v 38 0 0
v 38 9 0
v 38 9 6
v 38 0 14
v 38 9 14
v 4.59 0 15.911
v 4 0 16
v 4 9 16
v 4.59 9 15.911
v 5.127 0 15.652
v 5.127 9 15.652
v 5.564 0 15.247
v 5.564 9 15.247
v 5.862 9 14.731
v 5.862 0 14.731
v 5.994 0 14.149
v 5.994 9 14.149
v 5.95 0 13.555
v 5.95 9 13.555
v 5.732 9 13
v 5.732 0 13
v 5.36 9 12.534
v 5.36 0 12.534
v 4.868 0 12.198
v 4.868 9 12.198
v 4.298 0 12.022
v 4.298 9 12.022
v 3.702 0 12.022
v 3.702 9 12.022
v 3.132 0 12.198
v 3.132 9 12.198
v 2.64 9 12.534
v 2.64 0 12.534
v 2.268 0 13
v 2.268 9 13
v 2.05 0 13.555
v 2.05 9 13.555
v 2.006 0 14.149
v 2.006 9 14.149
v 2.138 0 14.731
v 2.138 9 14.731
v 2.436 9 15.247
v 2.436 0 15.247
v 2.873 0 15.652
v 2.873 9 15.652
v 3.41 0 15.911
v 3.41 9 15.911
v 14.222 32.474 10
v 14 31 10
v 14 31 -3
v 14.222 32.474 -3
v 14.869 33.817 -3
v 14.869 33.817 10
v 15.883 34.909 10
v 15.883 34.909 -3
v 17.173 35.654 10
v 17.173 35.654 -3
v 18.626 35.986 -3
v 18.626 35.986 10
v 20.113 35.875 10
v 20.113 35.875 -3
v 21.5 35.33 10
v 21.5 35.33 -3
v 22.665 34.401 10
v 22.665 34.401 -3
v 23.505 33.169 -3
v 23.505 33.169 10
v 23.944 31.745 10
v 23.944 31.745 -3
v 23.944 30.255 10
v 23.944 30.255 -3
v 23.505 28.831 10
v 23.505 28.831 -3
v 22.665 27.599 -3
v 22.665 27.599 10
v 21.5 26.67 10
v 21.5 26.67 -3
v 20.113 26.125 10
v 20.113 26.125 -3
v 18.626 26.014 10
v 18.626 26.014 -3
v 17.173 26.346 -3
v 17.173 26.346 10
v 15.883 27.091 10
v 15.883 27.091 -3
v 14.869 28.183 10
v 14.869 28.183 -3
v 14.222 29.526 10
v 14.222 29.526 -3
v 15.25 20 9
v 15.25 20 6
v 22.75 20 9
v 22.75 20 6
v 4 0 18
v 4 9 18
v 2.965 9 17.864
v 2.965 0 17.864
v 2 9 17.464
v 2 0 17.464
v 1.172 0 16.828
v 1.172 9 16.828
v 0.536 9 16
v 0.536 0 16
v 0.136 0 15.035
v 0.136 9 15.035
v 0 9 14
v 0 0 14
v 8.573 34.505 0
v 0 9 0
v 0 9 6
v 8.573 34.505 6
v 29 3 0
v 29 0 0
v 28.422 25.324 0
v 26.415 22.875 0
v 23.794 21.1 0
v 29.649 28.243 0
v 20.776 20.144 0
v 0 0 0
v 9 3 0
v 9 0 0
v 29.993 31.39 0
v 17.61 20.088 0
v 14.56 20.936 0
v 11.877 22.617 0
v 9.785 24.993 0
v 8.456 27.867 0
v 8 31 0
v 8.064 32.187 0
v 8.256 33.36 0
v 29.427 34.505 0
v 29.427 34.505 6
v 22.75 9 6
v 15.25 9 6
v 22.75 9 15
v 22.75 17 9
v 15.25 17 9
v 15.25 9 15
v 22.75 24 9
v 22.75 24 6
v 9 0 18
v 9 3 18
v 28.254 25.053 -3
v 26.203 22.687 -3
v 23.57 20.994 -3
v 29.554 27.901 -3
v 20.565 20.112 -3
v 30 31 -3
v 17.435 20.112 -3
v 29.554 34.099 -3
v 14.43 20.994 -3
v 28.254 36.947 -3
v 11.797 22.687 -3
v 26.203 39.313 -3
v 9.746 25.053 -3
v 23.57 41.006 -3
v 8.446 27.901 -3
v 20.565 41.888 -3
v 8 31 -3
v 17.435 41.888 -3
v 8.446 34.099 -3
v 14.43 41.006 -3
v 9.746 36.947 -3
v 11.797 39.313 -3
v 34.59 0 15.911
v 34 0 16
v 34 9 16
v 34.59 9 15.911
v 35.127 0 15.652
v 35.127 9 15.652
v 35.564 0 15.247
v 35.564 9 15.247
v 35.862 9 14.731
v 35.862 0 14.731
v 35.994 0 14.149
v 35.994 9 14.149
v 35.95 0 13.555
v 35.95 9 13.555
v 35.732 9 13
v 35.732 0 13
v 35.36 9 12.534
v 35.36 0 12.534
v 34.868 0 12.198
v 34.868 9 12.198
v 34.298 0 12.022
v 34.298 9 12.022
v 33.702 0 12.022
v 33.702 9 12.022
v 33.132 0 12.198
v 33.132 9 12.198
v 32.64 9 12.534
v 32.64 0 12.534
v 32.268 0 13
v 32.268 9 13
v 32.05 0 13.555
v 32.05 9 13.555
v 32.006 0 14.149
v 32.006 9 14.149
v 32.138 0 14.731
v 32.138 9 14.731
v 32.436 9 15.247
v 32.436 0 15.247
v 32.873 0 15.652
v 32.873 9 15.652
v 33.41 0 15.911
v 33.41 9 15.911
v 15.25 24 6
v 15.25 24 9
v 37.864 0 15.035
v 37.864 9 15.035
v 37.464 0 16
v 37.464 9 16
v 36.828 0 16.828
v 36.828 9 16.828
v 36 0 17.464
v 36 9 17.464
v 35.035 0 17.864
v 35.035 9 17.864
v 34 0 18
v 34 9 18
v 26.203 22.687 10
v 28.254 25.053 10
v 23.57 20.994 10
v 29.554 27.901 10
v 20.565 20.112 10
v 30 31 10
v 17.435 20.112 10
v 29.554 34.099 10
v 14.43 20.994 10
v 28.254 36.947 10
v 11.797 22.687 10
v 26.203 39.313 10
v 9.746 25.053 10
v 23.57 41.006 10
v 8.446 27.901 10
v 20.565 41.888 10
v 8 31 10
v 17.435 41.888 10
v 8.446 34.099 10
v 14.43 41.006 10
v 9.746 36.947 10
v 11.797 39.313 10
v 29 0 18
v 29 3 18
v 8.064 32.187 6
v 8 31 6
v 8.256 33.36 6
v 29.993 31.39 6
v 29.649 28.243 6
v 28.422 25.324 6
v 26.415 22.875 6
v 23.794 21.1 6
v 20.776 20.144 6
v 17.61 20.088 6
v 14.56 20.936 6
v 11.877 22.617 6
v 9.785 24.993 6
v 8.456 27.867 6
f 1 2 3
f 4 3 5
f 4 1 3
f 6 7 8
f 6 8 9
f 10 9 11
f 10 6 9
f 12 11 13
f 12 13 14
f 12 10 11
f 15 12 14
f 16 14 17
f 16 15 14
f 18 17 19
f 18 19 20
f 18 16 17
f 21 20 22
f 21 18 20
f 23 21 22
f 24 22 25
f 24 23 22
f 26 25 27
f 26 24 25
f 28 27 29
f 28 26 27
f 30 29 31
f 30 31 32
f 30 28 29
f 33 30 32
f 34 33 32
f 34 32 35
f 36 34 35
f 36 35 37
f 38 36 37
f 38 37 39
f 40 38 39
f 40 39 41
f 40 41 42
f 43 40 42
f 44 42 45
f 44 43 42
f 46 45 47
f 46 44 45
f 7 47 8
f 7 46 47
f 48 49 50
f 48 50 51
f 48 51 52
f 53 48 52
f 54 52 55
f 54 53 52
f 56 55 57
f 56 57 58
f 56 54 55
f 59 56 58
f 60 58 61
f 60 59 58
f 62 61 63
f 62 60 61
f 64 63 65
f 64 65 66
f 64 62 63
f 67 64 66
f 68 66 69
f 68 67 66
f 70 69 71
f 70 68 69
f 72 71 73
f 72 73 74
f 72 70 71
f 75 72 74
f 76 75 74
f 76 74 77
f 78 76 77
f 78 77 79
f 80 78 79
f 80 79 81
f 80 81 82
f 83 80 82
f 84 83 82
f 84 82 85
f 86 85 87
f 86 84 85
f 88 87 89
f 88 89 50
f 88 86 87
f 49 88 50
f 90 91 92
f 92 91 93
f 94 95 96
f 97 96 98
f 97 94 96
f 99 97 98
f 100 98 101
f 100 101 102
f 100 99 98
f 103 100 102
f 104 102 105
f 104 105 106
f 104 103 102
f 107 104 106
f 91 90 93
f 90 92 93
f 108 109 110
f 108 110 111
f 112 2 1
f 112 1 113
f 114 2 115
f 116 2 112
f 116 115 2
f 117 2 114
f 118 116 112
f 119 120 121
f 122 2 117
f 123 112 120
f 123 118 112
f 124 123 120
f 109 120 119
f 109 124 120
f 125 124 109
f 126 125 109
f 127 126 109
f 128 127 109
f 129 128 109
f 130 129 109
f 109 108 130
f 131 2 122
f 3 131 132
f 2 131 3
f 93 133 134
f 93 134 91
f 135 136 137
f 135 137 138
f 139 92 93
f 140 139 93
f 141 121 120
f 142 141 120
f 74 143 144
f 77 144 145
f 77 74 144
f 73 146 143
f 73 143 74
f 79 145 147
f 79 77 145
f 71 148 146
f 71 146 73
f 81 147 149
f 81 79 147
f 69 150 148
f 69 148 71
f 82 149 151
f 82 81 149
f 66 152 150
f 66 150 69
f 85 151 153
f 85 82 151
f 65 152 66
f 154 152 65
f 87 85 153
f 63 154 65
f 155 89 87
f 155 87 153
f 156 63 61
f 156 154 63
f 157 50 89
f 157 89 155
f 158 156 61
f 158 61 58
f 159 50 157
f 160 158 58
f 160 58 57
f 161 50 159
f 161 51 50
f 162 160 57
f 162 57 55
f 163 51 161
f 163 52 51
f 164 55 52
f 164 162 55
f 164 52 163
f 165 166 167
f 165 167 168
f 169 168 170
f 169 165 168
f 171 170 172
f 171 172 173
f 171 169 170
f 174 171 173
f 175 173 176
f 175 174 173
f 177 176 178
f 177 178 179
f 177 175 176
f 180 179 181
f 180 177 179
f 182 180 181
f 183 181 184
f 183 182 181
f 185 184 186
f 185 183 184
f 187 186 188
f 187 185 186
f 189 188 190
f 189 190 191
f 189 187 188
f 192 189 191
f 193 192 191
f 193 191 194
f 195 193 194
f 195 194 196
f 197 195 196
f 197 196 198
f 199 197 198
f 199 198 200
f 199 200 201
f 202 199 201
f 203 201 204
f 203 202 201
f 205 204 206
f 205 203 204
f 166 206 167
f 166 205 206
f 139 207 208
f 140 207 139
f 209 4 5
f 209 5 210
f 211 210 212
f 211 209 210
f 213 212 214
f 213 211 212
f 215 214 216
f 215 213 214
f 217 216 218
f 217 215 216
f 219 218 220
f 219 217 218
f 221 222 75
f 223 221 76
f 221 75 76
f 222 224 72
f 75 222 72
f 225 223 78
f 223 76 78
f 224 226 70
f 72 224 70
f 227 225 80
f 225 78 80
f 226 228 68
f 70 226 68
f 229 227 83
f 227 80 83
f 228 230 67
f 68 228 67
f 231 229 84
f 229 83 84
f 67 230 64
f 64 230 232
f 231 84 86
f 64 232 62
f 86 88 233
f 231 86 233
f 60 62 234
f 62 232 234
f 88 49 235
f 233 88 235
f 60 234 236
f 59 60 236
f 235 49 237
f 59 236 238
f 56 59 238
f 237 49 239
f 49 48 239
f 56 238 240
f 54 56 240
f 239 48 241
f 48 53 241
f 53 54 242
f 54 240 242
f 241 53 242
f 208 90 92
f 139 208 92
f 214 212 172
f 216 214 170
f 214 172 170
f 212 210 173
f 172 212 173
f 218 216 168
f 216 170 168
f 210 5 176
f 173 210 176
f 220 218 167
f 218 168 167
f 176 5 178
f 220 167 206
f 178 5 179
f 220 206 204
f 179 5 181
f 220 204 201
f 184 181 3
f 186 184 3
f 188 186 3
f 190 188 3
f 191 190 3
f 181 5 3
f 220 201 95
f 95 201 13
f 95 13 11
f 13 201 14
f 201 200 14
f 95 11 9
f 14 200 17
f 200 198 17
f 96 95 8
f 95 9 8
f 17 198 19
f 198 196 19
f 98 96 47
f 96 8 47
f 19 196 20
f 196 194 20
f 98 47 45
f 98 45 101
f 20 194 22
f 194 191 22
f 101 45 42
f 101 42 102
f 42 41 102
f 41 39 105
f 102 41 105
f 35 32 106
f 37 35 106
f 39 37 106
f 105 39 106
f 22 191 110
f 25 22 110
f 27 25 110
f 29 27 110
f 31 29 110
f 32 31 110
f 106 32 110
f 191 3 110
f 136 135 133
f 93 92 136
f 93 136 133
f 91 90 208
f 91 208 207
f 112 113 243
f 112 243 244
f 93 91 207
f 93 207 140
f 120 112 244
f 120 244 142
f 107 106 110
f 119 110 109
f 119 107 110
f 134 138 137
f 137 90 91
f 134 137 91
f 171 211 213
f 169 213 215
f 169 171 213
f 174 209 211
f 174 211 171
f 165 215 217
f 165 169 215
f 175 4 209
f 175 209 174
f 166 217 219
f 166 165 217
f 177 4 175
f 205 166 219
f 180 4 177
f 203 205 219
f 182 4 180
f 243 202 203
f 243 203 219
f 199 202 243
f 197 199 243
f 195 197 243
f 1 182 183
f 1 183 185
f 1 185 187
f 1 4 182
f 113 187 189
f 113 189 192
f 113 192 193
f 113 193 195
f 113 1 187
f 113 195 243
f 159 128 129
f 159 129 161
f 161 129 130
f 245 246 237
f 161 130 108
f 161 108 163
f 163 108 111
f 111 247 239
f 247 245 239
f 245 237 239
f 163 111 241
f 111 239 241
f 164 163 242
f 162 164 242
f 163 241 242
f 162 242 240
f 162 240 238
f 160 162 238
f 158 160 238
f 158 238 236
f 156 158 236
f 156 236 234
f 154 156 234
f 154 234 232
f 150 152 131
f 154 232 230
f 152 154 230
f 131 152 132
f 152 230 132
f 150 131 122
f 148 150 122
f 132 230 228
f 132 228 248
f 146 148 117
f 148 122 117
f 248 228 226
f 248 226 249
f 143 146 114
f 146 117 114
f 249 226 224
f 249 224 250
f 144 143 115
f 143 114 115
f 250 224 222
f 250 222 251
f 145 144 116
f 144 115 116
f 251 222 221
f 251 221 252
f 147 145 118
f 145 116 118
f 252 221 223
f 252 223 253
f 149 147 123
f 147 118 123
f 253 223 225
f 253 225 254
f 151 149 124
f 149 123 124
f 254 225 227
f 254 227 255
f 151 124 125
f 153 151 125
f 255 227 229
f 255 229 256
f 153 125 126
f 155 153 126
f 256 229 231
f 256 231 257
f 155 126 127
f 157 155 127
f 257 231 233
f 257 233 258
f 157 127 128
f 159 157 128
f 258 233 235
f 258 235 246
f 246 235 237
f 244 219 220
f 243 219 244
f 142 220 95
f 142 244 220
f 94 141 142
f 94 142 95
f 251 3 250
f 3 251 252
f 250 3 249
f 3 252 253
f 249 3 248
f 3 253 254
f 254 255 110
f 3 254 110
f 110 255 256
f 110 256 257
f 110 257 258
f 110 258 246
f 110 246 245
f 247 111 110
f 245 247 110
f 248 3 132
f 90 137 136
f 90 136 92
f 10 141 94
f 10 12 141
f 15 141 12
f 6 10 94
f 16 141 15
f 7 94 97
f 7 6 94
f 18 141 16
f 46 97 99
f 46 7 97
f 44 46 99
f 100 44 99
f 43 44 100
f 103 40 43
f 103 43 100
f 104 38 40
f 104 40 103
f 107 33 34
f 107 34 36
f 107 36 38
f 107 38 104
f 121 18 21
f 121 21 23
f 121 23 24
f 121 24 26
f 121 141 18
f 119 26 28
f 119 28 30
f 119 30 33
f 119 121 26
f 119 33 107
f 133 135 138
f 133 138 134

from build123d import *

# Parameters (mm, degrees)
SKETCH_1_R           = 2
EXTRUDE_1_DEPTH      = 9
EXTRUDE_2_DEPTH      = 6
EXTRUDE_4_DEPTH      = 3
EXTRUDE_4_DEPTH_BACK = 10
SKETCH_3_5_R         = 11
SKETCH_3_5_R_2       = 5
SKETCH_6_W           = 3
SKETCH_6_H           = 3
EXTRUDE_14_DEPTH     = 3.75
SKETCH_7_W           = 20
SKETCH_7_H           = 3
CUT_EXTRUDE_1_DEPTH  = 18
SKETCH_8_W           = 7.5
SKETCH_8_H           = 3
EXTRUDE_17_DEPTH     = 4


with BuildPart() as part:
    # 草图1 → 凸台-拉伸1 (new body)
    with BuildSketch(Plane(origin=(0, 0, 0), x_dir=(1, 0, 0), z_dir=(0, 1, 0))):
        with BuildLine():
            Line((0, 0), (38, 0))
            Line((38, 0), (38, -14))
            ThreePointArc((38, -14), (36.828427125, -16.828427125), (34, -18))
            Line((34, -18), (4, -18))
            ThreePointArc((4, -18), (1.171572875, -16.828427125), (0, -14))
            Line((0, -14), (0, 0))
        make_face()
        with Locations(Location((4, -14, 0), (0, 0, 270))):
            Circle(SKETCH_1_R, mode=Mode.SUBTRACT)
        with Locations(Location((34, -14, 0), (0, 0, 270))):
            Circle(SKETCH_1_R, mode=Mode.SUBTRACT)
    extrude(amount=EXTRUDE_1_DEPTH)

    # 草图3 → 凸台-拉伸2 (add)
    with BuildSketch(Plane(origin=(0, 0, 0), x_dir=(-1, 0, 0), z_dir=(0, 0, -1))):
        with BuildLine():
            Line((-38, 9), (-22.5, 9))
            Line((-22.5, 9), (-19, 9))
            Line((-19, 9), (-15.5, 9))
            Line((-15.5, 9), (0, 9))
            Line((0, 9), (-8.57330883, 34.504869647))
            ThreePointArc((-8.57330883, 34.504869647), (-8.144273335, 32.7757248), (-8, 31))
            ThreePointArc((-8, 31), (-20.7757248, 20.144273335), (-29.42669117, 34.504869647))
            Line((-29.42669117, 34.504869647), (-38, 9))
        make_face()
    extrude(amount=-EXTRUDE_2_DEPTH)

    # 草图3<5> → 凸台-拉伸4 (add, two sides: drawn at the far end of the back side and taken through both)
    with BuildSketch(Plane(origin=(0, 0, 0), x_dir=(-1, 0, 0), z_dir=(0, 0, -1)).offset(-EXTRUDE_4_DEPTH_BACK)):
        with Locations((-19, 31)):
            Circle(SKETCH_3_5_R)
        with Locations((-19, 31)):
            Circle(SKETCH_3_5_R_2, mode=Mode.SUBTRACT)
    extrude(amount=EXTRUDE_4_DEPTH + EXTRUDE_4_DEPTH_BACK)

    # 草图7 → 切除-拉伸1 (cut)
    with BuildSketch(Plane(origin=(0, 0, 0), x_dir=(-1, 0, 0), z_dir=(0, 0, -1))):
        with Locations((-19, 1.5)):
            Rectangle(SKETCH_7_W, SKETCH_7_H)
    extrude(amount=-CUT_EXTRUDE_1_DEPTH, mode=Mode.SUBTRACT)


with BuildPart() as body_2:
    # 草图6 → 凸台-拉伸14 (new, symmetric)
    with BuildSketch(Plane(origin=(19, 0, 0), x_dir=(0, 0, -1), z_dir=(1, 0, 0))):
        with Locations((-7.5, 18.5)):
            Rectangle(SKETCH_6_W, SKETCH_6_H)
        Polygon((-15, 9), (-6, 9), (-6, 17), (-9, 17), align=None)
    extrude(amount=EXTRUDE_14_DEPTH, both=True)


with BuildPart() as body_3:
    # 草图8 → 凸台-拉伸17 (new body)
    with BuildSketch(Plane(origin=(0, 20, 0), x_dir=(1, 0, 0), z_dir=(0, 1, 0))):
        with Locations((19, -7.5)):
            Rectangle(SKETCH_8_W, SKETCH_8_H)
    extrude(amount=EXTRUDE_17_DEPTH)


solid = Compound([part.part, body_2.part, body_3.part])
